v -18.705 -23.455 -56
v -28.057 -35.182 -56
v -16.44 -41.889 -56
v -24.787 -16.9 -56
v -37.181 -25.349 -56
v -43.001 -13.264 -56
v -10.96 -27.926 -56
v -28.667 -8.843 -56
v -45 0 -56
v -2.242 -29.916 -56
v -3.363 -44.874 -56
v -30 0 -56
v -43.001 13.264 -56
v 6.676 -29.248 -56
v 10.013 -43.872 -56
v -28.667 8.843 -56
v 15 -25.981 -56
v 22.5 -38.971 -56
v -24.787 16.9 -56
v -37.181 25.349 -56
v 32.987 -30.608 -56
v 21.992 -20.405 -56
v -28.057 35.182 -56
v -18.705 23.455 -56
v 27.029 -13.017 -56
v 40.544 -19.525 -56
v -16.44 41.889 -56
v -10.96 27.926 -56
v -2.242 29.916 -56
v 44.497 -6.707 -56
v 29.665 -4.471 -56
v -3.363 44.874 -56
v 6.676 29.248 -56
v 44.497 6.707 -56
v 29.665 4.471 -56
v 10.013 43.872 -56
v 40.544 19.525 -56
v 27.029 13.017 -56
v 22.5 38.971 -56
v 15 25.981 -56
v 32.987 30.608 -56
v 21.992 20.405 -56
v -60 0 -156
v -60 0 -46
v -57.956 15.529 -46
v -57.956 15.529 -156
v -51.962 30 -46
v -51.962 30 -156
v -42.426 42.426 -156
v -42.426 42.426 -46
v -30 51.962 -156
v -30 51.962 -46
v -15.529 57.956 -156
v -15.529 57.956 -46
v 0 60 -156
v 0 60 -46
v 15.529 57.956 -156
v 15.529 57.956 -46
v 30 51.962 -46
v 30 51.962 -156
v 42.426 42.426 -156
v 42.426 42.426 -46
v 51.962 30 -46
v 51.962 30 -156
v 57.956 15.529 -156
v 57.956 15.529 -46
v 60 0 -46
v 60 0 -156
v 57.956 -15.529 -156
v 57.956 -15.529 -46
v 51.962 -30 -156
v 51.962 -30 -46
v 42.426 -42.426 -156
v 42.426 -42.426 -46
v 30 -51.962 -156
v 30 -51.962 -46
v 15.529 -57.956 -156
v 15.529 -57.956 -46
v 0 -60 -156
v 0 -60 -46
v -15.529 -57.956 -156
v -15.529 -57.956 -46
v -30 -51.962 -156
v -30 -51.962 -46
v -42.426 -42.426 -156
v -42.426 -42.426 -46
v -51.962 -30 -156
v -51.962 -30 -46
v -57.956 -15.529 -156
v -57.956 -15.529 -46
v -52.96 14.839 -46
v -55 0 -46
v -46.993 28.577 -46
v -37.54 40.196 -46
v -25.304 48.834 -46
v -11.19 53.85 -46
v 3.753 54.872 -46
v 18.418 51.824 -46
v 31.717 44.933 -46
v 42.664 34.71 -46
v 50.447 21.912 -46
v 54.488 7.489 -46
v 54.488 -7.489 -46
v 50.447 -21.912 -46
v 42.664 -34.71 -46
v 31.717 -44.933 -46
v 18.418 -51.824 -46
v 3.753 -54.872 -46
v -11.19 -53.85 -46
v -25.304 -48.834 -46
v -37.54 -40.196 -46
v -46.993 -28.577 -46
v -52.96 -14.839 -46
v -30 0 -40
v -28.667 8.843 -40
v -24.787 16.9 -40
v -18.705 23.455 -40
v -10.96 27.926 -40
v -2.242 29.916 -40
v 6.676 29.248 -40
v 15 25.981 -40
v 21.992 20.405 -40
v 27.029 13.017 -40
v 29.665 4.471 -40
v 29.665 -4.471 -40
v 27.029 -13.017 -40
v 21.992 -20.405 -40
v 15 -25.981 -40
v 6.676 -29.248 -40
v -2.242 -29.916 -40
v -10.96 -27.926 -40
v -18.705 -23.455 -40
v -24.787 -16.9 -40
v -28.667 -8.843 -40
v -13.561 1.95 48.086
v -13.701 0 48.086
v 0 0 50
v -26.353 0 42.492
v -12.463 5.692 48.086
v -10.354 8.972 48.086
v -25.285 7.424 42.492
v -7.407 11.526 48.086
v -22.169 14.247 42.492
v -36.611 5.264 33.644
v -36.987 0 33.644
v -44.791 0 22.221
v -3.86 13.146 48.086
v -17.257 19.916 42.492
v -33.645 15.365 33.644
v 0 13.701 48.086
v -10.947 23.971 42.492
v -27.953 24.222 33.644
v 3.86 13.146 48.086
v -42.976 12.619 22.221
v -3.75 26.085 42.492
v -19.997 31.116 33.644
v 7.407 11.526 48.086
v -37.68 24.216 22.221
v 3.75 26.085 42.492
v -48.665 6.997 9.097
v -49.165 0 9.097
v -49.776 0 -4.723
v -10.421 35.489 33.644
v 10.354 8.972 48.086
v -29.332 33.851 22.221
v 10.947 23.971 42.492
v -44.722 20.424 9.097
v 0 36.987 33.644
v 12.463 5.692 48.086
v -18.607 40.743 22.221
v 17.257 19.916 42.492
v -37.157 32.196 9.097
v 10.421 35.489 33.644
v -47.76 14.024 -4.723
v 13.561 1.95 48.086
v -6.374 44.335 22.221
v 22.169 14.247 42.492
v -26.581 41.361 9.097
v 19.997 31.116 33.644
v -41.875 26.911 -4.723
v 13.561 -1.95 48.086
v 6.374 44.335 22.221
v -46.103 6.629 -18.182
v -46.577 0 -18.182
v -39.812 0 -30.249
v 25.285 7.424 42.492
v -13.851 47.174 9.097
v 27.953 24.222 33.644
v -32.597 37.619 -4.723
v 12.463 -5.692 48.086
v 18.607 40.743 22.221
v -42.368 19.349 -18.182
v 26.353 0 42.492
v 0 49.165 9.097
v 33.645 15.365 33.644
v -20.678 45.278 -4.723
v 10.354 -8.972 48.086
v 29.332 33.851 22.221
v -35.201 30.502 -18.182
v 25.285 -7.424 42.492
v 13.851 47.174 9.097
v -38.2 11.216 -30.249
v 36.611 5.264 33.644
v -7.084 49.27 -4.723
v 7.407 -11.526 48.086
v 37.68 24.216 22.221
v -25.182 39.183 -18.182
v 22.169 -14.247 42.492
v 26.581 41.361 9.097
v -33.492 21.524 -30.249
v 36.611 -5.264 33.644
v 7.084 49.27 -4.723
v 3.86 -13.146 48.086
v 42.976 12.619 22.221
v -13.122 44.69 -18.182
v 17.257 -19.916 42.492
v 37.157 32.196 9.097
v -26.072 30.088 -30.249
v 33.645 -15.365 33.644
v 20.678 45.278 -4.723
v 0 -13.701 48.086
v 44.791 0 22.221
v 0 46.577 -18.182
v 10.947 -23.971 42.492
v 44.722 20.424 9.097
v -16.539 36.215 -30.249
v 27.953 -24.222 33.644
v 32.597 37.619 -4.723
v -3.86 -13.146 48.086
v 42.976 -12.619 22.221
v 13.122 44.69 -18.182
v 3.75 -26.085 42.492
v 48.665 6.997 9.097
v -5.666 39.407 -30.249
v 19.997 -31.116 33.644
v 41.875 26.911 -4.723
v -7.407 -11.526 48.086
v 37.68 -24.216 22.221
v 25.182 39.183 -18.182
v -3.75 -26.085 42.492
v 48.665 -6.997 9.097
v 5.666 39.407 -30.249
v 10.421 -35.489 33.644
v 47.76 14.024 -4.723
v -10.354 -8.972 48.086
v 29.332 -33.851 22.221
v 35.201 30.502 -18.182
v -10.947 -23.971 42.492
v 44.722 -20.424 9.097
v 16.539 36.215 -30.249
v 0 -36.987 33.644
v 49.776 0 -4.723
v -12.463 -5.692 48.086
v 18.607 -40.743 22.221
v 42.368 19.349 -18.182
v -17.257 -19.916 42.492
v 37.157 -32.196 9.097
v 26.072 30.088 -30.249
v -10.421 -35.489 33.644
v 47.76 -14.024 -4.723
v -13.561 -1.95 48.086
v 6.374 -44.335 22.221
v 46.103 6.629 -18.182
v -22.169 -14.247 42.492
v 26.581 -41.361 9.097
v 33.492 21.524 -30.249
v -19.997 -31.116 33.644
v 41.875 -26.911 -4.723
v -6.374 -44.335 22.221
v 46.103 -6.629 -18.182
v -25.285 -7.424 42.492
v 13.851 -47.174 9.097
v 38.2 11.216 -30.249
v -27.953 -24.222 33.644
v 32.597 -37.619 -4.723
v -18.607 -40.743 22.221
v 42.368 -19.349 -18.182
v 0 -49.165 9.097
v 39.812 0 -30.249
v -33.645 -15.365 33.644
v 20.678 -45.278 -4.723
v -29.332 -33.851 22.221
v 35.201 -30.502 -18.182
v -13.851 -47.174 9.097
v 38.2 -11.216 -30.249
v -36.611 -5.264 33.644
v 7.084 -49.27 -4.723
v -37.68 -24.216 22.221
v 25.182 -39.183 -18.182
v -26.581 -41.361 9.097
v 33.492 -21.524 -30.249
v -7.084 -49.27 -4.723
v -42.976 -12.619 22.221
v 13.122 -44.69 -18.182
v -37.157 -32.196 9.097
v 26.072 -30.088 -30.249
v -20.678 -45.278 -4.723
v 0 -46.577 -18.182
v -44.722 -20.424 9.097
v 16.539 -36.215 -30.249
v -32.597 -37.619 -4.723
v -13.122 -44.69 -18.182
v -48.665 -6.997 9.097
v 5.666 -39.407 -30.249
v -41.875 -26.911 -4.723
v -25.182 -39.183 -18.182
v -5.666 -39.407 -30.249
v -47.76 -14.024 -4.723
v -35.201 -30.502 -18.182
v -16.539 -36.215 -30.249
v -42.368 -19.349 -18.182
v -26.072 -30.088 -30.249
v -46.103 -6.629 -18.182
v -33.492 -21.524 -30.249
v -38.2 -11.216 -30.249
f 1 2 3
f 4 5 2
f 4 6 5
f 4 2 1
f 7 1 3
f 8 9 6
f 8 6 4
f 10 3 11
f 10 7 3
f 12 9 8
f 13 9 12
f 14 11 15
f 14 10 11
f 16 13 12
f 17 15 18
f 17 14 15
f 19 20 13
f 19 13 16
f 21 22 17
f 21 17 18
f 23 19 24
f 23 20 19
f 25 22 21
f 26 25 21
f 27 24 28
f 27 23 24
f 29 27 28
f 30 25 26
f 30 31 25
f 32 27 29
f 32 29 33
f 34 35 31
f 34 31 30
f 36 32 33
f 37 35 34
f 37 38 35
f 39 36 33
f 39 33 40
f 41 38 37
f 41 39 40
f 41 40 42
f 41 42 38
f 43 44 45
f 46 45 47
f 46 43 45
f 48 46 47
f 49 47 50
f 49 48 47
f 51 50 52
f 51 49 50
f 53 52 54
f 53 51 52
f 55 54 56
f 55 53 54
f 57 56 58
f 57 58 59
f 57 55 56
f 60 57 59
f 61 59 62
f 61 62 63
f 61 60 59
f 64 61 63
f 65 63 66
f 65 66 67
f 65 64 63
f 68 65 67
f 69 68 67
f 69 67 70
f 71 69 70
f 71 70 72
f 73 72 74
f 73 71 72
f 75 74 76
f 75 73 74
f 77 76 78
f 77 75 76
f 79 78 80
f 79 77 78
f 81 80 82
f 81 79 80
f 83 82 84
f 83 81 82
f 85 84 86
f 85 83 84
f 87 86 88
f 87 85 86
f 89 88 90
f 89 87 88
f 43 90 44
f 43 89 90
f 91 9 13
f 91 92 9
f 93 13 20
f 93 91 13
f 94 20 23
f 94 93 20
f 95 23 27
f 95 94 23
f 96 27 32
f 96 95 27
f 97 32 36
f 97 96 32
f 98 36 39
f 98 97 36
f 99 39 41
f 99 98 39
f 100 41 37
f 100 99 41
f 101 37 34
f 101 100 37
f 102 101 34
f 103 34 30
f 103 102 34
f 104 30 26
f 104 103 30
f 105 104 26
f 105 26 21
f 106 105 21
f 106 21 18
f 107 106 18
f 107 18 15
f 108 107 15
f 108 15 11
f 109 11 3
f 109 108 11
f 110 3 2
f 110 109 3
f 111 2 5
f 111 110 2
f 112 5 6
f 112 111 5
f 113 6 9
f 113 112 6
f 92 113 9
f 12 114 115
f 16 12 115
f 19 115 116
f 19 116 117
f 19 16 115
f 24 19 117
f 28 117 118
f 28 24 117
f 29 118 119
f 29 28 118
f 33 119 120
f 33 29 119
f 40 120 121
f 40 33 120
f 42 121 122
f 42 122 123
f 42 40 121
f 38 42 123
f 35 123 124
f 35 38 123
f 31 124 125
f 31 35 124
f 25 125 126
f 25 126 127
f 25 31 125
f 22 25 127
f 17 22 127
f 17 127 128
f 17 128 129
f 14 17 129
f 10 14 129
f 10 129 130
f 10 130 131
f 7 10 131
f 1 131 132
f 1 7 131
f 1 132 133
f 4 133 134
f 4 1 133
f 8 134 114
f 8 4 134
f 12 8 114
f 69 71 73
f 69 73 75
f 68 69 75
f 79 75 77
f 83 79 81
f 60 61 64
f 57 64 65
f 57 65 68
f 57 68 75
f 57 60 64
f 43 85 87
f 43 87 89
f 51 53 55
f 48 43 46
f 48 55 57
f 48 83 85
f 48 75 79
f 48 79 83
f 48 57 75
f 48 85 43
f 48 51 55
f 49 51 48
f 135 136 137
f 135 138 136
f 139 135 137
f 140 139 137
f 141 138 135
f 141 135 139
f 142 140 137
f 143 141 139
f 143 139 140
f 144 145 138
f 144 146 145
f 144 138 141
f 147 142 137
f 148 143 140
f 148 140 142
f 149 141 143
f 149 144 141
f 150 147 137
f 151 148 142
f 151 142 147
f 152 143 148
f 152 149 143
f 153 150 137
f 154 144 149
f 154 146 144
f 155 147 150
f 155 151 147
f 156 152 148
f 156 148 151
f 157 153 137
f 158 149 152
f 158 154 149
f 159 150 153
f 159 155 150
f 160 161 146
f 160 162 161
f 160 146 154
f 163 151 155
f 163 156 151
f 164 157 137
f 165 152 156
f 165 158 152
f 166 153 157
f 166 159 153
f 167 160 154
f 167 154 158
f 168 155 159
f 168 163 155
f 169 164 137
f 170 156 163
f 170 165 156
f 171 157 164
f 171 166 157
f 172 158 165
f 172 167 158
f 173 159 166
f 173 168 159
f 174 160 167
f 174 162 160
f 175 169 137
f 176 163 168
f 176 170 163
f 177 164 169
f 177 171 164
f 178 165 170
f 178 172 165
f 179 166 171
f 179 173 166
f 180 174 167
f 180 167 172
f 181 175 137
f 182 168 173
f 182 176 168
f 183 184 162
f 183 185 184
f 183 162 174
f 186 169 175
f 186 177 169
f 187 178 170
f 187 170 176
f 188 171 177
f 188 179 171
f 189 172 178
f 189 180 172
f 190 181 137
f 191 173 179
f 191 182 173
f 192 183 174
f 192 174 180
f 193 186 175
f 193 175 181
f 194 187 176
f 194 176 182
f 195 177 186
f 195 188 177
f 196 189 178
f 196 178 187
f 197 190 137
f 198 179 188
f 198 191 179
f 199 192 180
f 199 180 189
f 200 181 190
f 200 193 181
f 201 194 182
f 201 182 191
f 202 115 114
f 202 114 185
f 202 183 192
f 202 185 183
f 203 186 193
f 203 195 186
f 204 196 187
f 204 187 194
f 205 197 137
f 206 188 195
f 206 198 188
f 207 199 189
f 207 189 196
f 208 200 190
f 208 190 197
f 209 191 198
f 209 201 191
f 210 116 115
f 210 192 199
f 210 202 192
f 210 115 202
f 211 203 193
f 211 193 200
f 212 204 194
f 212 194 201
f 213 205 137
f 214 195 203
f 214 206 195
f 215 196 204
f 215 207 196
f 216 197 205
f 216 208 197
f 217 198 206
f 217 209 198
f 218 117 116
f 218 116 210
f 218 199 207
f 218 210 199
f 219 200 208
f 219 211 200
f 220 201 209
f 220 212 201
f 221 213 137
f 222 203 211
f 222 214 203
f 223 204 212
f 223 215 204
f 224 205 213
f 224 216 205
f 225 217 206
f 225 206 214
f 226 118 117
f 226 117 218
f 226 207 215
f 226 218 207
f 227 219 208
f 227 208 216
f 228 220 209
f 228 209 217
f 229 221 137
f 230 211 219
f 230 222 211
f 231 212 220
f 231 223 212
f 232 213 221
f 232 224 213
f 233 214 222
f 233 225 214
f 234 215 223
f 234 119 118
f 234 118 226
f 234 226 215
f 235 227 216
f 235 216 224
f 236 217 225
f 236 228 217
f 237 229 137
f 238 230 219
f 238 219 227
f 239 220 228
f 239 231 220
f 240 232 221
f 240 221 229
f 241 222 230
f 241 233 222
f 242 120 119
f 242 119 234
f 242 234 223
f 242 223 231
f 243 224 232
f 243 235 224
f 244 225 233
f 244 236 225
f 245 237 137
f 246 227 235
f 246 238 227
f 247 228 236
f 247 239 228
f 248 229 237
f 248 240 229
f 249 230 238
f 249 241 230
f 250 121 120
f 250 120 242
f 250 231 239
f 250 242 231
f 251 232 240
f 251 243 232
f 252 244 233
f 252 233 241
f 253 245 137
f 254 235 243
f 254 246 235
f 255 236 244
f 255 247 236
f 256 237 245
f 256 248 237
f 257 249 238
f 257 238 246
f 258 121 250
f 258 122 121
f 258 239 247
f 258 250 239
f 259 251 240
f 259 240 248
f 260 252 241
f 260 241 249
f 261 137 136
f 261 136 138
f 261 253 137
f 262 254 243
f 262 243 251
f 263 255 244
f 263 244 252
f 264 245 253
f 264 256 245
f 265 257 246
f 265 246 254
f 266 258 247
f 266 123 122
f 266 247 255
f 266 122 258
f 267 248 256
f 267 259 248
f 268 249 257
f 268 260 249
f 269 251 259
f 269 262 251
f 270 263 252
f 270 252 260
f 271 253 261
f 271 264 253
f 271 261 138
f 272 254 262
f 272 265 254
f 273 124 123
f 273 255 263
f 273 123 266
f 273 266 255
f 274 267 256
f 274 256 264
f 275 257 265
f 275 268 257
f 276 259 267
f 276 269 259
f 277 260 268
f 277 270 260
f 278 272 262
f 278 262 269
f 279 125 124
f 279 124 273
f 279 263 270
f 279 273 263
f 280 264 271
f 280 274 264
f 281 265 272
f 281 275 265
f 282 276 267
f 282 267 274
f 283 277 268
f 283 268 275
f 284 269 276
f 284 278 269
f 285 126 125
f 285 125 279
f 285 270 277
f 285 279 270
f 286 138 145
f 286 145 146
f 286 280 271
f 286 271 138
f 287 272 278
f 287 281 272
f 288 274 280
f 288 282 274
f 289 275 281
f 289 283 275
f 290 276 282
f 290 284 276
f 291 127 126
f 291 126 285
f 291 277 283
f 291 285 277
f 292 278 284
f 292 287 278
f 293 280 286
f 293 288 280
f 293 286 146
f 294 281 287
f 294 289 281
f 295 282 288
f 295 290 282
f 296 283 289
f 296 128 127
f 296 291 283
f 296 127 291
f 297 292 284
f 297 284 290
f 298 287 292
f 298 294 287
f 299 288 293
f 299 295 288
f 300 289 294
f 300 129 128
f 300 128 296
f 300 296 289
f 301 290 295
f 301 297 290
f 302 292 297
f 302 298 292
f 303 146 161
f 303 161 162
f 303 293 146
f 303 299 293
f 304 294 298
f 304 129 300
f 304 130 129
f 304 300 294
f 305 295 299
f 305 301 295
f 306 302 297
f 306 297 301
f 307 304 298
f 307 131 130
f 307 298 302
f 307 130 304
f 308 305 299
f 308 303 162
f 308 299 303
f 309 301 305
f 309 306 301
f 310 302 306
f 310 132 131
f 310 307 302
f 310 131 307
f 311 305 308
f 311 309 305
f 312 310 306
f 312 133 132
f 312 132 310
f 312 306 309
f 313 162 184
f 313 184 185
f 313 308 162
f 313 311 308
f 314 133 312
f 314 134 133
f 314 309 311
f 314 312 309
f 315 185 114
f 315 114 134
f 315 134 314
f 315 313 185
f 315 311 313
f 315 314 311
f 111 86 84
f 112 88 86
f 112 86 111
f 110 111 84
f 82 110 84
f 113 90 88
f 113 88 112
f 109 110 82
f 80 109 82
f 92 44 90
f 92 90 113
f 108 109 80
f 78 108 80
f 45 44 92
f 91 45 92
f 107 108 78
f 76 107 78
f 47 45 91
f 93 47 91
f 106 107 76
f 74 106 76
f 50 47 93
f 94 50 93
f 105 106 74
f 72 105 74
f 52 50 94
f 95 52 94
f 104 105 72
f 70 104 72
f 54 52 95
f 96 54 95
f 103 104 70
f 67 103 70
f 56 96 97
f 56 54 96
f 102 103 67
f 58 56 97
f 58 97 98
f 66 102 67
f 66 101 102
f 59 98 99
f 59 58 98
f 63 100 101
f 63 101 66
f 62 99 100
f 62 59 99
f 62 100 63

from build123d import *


with BuildPart() as f1:
    # F0 (on Front) → F1 (revolve)
    with BuildSketch(Plane.XZ):
        with BuildLine():
            ThreePointArc((-30, -40), (-15.8113883008, -47.4341649025), (0, -50))
            Line((0, -50), (0, 50))
            ThreePointArc((0, 50), (-47.4341649025, 15.8113883008), (-30, -40))
        make_face()
        with BuildLine():
            Line((0, -56), (0, -50))
            ThreePointArc((0, -50), (-15.8113883008, -47.4341649025), (-30, -40))
            Line((-30, -40), (-30, -56))
            Line((-30, -56), (0, -56))
        make_face()
        Polygon((-60, -56), (-45, -56), (-55, -46), (-60, -46), align=None)
        Polygon((0, -156), (0, -56), (-30, -56), (-45, -56), (-60, -56), (-60, -156), align=None)
    revolve(axis=Axis((0, 0, -3), (0, 0, -1)))


solid = f1.part
